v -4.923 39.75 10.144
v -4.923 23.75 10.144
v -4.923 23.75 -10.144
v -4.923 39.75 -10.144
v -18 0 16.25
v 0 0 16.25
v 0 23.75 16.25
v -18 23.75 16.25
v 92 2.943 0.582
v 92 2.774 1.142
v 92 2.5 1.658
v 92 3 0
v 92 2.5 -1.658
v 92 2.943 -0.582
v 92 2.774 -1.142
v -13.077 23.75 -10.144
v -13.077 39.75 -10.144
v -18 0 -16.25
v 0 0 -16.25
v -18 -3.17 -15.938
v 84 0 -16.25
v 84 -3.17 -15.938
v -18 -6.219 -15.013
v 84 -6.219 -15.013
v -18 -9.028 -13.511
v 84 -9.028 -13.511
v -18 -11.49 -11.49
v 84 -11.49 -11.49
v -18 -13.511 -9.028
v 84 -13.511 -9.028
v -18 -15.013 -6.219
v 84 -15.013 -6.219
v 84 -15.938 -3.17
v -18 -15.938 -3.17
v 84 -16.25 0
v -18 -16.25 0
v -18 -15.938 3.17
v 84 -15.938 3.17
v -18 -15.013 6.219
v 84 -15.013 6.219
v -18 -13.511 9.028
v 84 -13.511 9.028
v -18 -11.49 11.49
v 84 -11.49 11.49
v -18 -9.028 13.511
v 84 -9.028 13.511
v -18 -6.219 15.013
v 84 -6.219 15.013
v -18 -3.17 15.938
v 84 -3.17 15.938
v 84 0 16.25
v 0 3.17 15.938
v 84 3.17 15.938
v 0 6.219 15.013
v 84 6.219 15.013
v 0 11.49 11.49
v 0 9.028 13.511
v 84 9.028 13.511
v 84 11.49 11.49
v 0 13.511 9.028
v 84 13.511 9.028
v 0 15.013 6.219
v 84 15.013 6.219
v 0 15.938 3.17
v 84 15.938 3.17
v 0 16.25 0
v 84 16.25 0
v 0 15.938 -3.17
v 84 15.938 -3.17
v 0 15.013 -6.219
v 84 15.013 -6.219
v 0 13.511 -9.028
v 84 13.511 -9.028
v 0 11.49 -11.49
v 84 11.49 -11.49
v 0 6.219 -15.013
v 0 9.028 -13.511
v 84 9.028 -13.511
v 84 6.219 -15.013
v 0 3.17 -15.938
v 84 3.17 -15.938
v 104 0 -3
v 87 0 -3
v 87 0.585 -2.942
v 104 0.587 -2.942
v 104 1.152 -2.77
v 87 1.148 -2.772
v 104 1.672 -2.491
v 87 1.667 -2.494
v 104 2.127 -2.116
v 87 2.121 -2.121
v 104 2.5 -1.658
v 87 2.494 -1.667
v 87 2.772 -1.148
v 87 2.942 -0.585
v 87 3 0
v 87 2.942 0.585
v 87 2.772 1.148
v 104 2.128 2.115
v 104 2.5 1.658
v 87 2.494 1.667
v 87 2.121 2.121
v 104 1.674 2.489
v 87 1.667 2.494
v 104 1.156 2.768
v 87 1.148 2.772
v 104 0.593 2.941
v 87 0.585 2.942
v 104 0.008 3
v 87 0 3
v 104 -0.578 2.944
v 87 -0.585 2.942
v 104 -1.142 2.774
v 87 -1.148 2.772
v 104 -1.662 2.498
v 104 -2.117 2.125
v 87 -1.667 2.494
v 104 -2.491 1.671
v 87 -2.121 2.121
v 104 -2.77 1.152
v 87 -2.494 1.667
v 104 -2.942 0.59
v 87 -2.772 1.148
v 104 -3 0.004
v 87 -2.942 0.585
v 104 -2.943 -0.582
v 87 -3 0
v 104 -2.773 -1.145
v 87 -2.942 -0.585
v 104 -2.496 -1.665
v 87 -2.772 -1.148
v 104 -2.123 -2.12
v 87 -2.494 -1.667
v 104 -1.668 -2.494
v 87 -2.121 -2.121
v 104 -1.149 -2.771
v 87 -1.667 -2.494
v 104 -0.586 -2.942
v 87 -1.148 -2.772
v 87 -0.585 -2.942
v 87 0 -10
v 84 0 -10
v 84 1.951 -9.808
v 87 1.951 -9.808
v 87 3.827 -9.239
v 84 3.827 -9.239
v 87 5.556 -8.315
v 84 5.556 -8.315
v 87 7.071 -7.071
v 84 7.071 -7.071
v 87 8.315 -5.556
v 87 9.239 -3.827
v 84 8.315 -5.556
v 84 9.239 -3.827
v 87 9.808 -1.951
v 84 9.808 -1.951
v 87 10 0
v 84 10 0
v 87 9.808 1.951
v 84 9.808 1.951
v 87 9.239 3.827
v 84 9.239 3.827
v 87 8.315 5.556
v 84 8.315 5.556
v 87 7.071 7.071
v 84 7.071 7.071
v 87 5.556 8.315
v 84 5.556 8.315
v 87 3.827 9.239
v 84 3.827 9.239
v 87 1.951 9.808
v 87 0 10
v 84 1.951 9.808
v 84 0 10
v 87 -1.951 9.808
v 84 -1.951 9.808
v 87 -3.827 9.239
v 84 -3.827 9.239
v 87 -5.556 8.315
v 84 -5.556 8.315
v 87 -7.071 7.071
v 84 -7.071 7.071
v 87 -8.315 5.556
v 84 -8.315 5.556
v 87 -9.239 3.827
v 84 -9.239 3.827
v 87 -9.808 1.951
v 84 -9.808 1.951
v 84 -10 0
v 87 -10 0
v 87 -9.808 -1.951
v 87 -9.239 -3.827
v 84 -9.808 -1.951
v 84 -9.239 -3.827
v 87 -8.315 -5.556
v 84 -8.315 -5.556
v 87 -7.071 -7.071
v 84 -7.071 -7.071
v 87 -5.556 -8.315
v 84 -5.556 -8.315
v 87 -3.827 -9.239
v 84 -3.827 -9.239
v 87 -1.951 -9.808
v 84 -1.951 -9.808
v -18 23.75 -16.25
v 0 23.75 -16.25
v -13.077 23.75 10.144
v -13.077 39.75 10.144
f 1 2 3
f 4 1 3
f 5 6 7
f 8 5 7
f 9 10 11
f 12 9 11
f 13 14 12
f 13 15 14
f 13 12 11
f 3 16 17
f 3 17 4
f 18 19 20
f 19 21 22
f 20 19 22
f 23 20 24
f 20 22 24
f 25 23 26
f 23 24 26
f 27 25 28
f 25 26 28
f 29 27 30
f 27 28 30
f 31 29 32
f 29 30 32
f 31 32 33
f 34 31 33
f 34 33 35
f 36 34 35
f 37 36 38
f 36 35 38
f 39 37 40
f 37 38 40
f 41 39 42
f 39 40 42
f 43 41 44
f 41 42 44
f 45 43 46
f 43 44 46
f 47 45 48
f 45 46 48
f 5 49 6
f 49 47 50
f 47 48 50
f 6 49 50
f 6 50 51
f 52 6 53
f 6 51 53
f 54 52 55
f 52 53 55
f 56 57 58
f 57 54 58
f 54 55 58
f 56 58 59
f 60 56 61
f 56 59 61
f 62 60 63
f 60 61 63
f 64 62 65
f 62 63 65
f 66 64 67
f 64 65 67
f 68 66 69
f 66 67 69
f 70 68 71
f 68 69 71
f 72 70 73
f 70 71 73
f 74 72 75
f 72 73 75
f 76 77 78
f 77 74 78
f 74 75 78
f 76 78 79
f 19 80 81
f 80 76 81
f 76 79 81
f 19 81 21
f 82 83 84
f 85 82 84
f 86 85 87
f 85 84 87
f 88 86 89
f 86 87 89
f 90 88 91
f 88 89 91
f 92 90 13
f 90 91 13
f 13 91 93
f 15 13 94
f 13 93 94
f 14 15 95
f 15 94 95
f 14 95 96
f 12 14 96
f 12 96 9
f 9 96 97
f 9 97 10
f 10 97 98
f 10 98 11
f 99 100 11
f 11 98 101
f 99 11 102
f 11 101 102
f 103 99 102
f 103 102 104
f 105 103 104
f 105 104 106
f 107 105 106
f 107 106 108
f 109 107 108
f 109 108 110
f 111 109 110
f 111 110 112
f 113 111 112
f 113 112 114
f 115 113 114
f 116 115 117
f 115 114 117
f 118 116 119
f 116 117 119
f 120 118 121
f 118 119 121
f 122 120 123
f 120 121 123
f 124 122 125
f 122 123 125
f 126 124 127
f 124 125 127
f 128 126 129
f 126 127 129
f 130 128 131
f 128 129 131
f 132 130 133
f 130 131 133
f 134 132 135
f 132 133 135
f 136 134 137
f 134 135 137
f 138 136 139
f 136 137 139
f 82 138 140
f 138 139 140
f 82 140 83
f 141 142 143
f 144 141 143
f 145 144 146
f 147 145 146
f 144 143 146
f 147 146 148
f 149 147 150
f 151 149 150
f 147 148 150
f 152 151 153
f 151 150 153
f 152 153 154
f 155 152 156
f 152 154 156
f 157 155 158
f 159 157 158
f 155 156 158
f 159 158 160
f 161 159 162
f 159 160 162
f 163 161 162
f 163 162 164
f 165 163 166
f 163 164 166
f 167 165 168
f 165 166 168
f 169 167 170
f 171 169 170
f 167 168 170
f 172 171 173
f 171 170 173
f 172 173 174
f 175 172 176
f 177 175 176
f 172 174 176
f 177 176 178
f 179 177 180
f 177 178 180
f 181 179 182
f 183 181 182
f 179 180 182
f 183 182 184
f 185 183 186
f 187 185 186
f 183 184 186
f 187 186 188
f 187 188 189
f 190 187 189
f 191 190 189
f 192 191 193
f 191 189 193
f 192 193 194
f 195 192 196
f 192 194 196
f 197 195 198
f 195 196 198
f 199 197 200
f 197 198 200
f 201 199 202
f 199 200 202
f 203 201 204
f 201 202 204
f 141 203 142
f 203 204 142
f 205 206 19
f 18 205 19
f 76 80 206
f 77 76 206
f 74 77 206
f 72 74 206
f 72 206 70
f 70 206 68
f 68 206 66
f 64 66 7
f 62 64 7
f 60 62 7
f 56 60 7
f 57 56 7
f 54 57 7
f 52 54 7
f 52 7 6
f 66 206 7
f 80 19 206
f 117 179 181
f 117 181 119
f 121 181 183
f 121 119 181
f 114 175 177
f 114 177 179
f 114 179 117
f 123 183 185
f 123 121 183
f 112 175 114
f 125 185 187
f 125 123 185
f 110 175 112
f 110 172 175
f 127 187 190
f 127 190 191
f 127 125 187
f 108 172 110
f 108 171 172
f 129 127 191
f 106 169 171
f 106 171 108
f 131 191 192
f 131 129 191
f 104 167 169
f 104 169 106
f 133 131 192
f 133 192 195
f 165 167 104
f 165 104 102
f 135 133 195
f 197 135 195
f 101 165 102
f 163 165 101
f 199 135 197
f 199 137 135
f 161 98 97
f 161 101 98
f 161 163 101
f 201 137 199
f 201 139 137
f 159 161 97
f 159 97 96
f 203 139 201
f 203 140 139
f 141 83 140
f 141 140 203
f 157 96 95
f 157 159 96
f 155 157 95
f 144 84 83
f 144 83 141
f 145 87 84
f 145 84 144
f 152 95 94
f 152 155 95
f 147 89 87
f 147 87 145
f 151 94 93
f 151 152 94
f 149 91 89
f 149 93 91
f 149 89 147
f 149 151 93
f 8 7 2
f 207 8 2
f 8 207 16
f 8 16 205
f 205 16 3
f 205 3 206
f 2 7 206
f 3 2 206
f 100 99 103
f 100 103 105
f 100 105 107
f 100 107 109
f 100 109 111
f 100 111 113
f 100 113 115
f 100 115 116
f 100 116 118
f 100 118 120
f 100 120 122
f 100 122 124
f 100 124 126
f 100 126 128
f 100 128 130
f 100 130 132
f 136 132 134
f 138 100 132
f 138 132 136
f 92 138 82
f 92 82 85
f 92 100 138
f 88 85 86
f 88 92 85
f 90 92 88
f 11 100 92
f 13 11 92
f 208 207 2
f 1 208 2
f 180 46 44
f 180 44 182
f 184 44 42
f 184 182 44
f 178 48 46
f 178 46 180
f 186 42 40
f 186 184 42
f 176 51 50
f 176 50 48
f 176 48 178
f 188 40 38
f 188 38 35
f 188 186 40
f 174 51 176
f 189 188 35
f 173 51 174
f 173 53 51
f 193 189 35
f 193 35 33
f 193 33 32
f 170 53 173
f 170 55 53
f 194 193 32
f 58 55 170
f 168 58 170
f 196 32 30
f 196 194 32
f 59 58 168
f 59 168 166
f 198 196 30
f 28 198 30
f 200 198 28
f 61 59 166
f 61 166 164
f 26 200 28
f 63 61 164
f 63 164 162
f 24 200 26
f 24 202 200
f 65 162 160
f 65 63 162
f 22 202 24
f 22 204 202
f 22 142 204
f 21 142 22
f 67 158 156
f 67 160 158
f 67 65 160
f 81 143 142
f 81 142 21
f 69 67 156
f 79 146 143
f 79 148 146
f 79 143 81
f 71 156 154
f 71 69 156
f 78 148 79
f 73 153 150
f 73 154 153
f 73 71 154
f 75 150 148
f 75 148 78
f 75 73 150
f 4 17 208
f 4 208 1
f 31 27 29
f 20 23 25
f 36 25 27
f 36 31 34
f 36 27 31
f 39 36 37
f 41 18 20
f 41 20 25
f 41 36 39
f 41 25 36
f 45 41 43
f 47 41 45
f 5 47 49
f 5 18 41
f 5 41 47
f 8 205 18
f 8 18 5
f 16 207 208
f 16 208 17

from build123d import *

# Parameters (mm, degrees)
SKETCH1_R           = 16.25
BOSS_EXTRUDE1_DEPTH = 84
SKETCH2_R           = 10
BOSS_EXTRUDE2_DEPTH = 3
SKETCH3_R           = 3
BOSS_EXTRUDE3_DEPTH = 17
CUT_EXTRUDE1_DEPTH  = 12
SKETCH5_R           = 16.25
BOSS_EXTRUDE4_DEPTH = 18
SKETCH6_W           = 8.15482979
SKETCH6_H           = 20.288083416
BOSS_EXTRUDE5_DEPTH = 16


with BuildPart() as part:
    # Sketch1 → Boss-Extrude1 (new body)
    with BuildSketch(Plane(origin=(0, 0, 0), x_dir=(0, 0, -1), z_dir=(1, 0, 0))):
        Circle(SKETCH1_R)
    extrude(amount=BOSS_EXTRUDE1_DEPTH)

    # Sketch2 → Boss-Extrude2 (add)
    with BuildSketch(Plane(origin=(84, 0, 0), x_dir=(0, 0, -1), z_dir=(1, 0, 0))):
        Circle(SKETCH2_R)
    extrude(amount=BOSS_EXTRUDE2_DEPTH)

    # Sketch3 → Boss-Extrude3 (add)
    with BuildSketch(Plane(origin=(87, 0, 0), x_dir=(0, 0, -1), z_dir=(1, 0, 0))):
        Circle(SKETCH3_R)
    extrude(amount=BOSS_EXTRUDE3_DEPTH)

    # Sketch4 → Cut-Extrude1 (cut)
    with BuildSketch(Plane(origin=(104, 0, 0), x_dir=(0, 0, -1), z_dir=(1, 0, 0))):
        Polygon((-63.514658307, 2.5), (-1.658312395, 2.5), (1.658312395, 2.5), (63.514658307, 2.5), (63.514658307, 126.212691825), (-63.514658307, 126.212691825), align=None)
    extrude(amount=-CUT_EXTRUDE1_DEPTH, mode=Mode.SUBTRACT)

    # Sketch5 → Boss-Extrude4 (add)
    with BuildSketch(Plane.ZY):
        Circle(SKETCH5_R)
        with BuildLine():
            Line((-16.25, 23.75), (-16.25, 0))
            ThreePointArc((-16.25, 0), (0, 16.25), (16.25, 0))
            Line((16.25, 0), (16.25, 23.75))
            Line((16.25, 23.75), (-16.25, 23.75))
        make_face()
    extrude(amount=BOSS_EXTRUDE4_DEPTH)

    # Sketch6 → Boss-Extrude5 (add)
    with BuildSketch(Plane(origin=(0, 23.75, 0), x_dir=(1, 0, 0), z_dir=(0, 1, 0))):
        with Locations((-9, 0)):
            Rectangle(SKETCH6_W, SKETCH6_H)
    extrude(amount=BOSS_EXTRUDE5_DEPTH)


solid = part.part
